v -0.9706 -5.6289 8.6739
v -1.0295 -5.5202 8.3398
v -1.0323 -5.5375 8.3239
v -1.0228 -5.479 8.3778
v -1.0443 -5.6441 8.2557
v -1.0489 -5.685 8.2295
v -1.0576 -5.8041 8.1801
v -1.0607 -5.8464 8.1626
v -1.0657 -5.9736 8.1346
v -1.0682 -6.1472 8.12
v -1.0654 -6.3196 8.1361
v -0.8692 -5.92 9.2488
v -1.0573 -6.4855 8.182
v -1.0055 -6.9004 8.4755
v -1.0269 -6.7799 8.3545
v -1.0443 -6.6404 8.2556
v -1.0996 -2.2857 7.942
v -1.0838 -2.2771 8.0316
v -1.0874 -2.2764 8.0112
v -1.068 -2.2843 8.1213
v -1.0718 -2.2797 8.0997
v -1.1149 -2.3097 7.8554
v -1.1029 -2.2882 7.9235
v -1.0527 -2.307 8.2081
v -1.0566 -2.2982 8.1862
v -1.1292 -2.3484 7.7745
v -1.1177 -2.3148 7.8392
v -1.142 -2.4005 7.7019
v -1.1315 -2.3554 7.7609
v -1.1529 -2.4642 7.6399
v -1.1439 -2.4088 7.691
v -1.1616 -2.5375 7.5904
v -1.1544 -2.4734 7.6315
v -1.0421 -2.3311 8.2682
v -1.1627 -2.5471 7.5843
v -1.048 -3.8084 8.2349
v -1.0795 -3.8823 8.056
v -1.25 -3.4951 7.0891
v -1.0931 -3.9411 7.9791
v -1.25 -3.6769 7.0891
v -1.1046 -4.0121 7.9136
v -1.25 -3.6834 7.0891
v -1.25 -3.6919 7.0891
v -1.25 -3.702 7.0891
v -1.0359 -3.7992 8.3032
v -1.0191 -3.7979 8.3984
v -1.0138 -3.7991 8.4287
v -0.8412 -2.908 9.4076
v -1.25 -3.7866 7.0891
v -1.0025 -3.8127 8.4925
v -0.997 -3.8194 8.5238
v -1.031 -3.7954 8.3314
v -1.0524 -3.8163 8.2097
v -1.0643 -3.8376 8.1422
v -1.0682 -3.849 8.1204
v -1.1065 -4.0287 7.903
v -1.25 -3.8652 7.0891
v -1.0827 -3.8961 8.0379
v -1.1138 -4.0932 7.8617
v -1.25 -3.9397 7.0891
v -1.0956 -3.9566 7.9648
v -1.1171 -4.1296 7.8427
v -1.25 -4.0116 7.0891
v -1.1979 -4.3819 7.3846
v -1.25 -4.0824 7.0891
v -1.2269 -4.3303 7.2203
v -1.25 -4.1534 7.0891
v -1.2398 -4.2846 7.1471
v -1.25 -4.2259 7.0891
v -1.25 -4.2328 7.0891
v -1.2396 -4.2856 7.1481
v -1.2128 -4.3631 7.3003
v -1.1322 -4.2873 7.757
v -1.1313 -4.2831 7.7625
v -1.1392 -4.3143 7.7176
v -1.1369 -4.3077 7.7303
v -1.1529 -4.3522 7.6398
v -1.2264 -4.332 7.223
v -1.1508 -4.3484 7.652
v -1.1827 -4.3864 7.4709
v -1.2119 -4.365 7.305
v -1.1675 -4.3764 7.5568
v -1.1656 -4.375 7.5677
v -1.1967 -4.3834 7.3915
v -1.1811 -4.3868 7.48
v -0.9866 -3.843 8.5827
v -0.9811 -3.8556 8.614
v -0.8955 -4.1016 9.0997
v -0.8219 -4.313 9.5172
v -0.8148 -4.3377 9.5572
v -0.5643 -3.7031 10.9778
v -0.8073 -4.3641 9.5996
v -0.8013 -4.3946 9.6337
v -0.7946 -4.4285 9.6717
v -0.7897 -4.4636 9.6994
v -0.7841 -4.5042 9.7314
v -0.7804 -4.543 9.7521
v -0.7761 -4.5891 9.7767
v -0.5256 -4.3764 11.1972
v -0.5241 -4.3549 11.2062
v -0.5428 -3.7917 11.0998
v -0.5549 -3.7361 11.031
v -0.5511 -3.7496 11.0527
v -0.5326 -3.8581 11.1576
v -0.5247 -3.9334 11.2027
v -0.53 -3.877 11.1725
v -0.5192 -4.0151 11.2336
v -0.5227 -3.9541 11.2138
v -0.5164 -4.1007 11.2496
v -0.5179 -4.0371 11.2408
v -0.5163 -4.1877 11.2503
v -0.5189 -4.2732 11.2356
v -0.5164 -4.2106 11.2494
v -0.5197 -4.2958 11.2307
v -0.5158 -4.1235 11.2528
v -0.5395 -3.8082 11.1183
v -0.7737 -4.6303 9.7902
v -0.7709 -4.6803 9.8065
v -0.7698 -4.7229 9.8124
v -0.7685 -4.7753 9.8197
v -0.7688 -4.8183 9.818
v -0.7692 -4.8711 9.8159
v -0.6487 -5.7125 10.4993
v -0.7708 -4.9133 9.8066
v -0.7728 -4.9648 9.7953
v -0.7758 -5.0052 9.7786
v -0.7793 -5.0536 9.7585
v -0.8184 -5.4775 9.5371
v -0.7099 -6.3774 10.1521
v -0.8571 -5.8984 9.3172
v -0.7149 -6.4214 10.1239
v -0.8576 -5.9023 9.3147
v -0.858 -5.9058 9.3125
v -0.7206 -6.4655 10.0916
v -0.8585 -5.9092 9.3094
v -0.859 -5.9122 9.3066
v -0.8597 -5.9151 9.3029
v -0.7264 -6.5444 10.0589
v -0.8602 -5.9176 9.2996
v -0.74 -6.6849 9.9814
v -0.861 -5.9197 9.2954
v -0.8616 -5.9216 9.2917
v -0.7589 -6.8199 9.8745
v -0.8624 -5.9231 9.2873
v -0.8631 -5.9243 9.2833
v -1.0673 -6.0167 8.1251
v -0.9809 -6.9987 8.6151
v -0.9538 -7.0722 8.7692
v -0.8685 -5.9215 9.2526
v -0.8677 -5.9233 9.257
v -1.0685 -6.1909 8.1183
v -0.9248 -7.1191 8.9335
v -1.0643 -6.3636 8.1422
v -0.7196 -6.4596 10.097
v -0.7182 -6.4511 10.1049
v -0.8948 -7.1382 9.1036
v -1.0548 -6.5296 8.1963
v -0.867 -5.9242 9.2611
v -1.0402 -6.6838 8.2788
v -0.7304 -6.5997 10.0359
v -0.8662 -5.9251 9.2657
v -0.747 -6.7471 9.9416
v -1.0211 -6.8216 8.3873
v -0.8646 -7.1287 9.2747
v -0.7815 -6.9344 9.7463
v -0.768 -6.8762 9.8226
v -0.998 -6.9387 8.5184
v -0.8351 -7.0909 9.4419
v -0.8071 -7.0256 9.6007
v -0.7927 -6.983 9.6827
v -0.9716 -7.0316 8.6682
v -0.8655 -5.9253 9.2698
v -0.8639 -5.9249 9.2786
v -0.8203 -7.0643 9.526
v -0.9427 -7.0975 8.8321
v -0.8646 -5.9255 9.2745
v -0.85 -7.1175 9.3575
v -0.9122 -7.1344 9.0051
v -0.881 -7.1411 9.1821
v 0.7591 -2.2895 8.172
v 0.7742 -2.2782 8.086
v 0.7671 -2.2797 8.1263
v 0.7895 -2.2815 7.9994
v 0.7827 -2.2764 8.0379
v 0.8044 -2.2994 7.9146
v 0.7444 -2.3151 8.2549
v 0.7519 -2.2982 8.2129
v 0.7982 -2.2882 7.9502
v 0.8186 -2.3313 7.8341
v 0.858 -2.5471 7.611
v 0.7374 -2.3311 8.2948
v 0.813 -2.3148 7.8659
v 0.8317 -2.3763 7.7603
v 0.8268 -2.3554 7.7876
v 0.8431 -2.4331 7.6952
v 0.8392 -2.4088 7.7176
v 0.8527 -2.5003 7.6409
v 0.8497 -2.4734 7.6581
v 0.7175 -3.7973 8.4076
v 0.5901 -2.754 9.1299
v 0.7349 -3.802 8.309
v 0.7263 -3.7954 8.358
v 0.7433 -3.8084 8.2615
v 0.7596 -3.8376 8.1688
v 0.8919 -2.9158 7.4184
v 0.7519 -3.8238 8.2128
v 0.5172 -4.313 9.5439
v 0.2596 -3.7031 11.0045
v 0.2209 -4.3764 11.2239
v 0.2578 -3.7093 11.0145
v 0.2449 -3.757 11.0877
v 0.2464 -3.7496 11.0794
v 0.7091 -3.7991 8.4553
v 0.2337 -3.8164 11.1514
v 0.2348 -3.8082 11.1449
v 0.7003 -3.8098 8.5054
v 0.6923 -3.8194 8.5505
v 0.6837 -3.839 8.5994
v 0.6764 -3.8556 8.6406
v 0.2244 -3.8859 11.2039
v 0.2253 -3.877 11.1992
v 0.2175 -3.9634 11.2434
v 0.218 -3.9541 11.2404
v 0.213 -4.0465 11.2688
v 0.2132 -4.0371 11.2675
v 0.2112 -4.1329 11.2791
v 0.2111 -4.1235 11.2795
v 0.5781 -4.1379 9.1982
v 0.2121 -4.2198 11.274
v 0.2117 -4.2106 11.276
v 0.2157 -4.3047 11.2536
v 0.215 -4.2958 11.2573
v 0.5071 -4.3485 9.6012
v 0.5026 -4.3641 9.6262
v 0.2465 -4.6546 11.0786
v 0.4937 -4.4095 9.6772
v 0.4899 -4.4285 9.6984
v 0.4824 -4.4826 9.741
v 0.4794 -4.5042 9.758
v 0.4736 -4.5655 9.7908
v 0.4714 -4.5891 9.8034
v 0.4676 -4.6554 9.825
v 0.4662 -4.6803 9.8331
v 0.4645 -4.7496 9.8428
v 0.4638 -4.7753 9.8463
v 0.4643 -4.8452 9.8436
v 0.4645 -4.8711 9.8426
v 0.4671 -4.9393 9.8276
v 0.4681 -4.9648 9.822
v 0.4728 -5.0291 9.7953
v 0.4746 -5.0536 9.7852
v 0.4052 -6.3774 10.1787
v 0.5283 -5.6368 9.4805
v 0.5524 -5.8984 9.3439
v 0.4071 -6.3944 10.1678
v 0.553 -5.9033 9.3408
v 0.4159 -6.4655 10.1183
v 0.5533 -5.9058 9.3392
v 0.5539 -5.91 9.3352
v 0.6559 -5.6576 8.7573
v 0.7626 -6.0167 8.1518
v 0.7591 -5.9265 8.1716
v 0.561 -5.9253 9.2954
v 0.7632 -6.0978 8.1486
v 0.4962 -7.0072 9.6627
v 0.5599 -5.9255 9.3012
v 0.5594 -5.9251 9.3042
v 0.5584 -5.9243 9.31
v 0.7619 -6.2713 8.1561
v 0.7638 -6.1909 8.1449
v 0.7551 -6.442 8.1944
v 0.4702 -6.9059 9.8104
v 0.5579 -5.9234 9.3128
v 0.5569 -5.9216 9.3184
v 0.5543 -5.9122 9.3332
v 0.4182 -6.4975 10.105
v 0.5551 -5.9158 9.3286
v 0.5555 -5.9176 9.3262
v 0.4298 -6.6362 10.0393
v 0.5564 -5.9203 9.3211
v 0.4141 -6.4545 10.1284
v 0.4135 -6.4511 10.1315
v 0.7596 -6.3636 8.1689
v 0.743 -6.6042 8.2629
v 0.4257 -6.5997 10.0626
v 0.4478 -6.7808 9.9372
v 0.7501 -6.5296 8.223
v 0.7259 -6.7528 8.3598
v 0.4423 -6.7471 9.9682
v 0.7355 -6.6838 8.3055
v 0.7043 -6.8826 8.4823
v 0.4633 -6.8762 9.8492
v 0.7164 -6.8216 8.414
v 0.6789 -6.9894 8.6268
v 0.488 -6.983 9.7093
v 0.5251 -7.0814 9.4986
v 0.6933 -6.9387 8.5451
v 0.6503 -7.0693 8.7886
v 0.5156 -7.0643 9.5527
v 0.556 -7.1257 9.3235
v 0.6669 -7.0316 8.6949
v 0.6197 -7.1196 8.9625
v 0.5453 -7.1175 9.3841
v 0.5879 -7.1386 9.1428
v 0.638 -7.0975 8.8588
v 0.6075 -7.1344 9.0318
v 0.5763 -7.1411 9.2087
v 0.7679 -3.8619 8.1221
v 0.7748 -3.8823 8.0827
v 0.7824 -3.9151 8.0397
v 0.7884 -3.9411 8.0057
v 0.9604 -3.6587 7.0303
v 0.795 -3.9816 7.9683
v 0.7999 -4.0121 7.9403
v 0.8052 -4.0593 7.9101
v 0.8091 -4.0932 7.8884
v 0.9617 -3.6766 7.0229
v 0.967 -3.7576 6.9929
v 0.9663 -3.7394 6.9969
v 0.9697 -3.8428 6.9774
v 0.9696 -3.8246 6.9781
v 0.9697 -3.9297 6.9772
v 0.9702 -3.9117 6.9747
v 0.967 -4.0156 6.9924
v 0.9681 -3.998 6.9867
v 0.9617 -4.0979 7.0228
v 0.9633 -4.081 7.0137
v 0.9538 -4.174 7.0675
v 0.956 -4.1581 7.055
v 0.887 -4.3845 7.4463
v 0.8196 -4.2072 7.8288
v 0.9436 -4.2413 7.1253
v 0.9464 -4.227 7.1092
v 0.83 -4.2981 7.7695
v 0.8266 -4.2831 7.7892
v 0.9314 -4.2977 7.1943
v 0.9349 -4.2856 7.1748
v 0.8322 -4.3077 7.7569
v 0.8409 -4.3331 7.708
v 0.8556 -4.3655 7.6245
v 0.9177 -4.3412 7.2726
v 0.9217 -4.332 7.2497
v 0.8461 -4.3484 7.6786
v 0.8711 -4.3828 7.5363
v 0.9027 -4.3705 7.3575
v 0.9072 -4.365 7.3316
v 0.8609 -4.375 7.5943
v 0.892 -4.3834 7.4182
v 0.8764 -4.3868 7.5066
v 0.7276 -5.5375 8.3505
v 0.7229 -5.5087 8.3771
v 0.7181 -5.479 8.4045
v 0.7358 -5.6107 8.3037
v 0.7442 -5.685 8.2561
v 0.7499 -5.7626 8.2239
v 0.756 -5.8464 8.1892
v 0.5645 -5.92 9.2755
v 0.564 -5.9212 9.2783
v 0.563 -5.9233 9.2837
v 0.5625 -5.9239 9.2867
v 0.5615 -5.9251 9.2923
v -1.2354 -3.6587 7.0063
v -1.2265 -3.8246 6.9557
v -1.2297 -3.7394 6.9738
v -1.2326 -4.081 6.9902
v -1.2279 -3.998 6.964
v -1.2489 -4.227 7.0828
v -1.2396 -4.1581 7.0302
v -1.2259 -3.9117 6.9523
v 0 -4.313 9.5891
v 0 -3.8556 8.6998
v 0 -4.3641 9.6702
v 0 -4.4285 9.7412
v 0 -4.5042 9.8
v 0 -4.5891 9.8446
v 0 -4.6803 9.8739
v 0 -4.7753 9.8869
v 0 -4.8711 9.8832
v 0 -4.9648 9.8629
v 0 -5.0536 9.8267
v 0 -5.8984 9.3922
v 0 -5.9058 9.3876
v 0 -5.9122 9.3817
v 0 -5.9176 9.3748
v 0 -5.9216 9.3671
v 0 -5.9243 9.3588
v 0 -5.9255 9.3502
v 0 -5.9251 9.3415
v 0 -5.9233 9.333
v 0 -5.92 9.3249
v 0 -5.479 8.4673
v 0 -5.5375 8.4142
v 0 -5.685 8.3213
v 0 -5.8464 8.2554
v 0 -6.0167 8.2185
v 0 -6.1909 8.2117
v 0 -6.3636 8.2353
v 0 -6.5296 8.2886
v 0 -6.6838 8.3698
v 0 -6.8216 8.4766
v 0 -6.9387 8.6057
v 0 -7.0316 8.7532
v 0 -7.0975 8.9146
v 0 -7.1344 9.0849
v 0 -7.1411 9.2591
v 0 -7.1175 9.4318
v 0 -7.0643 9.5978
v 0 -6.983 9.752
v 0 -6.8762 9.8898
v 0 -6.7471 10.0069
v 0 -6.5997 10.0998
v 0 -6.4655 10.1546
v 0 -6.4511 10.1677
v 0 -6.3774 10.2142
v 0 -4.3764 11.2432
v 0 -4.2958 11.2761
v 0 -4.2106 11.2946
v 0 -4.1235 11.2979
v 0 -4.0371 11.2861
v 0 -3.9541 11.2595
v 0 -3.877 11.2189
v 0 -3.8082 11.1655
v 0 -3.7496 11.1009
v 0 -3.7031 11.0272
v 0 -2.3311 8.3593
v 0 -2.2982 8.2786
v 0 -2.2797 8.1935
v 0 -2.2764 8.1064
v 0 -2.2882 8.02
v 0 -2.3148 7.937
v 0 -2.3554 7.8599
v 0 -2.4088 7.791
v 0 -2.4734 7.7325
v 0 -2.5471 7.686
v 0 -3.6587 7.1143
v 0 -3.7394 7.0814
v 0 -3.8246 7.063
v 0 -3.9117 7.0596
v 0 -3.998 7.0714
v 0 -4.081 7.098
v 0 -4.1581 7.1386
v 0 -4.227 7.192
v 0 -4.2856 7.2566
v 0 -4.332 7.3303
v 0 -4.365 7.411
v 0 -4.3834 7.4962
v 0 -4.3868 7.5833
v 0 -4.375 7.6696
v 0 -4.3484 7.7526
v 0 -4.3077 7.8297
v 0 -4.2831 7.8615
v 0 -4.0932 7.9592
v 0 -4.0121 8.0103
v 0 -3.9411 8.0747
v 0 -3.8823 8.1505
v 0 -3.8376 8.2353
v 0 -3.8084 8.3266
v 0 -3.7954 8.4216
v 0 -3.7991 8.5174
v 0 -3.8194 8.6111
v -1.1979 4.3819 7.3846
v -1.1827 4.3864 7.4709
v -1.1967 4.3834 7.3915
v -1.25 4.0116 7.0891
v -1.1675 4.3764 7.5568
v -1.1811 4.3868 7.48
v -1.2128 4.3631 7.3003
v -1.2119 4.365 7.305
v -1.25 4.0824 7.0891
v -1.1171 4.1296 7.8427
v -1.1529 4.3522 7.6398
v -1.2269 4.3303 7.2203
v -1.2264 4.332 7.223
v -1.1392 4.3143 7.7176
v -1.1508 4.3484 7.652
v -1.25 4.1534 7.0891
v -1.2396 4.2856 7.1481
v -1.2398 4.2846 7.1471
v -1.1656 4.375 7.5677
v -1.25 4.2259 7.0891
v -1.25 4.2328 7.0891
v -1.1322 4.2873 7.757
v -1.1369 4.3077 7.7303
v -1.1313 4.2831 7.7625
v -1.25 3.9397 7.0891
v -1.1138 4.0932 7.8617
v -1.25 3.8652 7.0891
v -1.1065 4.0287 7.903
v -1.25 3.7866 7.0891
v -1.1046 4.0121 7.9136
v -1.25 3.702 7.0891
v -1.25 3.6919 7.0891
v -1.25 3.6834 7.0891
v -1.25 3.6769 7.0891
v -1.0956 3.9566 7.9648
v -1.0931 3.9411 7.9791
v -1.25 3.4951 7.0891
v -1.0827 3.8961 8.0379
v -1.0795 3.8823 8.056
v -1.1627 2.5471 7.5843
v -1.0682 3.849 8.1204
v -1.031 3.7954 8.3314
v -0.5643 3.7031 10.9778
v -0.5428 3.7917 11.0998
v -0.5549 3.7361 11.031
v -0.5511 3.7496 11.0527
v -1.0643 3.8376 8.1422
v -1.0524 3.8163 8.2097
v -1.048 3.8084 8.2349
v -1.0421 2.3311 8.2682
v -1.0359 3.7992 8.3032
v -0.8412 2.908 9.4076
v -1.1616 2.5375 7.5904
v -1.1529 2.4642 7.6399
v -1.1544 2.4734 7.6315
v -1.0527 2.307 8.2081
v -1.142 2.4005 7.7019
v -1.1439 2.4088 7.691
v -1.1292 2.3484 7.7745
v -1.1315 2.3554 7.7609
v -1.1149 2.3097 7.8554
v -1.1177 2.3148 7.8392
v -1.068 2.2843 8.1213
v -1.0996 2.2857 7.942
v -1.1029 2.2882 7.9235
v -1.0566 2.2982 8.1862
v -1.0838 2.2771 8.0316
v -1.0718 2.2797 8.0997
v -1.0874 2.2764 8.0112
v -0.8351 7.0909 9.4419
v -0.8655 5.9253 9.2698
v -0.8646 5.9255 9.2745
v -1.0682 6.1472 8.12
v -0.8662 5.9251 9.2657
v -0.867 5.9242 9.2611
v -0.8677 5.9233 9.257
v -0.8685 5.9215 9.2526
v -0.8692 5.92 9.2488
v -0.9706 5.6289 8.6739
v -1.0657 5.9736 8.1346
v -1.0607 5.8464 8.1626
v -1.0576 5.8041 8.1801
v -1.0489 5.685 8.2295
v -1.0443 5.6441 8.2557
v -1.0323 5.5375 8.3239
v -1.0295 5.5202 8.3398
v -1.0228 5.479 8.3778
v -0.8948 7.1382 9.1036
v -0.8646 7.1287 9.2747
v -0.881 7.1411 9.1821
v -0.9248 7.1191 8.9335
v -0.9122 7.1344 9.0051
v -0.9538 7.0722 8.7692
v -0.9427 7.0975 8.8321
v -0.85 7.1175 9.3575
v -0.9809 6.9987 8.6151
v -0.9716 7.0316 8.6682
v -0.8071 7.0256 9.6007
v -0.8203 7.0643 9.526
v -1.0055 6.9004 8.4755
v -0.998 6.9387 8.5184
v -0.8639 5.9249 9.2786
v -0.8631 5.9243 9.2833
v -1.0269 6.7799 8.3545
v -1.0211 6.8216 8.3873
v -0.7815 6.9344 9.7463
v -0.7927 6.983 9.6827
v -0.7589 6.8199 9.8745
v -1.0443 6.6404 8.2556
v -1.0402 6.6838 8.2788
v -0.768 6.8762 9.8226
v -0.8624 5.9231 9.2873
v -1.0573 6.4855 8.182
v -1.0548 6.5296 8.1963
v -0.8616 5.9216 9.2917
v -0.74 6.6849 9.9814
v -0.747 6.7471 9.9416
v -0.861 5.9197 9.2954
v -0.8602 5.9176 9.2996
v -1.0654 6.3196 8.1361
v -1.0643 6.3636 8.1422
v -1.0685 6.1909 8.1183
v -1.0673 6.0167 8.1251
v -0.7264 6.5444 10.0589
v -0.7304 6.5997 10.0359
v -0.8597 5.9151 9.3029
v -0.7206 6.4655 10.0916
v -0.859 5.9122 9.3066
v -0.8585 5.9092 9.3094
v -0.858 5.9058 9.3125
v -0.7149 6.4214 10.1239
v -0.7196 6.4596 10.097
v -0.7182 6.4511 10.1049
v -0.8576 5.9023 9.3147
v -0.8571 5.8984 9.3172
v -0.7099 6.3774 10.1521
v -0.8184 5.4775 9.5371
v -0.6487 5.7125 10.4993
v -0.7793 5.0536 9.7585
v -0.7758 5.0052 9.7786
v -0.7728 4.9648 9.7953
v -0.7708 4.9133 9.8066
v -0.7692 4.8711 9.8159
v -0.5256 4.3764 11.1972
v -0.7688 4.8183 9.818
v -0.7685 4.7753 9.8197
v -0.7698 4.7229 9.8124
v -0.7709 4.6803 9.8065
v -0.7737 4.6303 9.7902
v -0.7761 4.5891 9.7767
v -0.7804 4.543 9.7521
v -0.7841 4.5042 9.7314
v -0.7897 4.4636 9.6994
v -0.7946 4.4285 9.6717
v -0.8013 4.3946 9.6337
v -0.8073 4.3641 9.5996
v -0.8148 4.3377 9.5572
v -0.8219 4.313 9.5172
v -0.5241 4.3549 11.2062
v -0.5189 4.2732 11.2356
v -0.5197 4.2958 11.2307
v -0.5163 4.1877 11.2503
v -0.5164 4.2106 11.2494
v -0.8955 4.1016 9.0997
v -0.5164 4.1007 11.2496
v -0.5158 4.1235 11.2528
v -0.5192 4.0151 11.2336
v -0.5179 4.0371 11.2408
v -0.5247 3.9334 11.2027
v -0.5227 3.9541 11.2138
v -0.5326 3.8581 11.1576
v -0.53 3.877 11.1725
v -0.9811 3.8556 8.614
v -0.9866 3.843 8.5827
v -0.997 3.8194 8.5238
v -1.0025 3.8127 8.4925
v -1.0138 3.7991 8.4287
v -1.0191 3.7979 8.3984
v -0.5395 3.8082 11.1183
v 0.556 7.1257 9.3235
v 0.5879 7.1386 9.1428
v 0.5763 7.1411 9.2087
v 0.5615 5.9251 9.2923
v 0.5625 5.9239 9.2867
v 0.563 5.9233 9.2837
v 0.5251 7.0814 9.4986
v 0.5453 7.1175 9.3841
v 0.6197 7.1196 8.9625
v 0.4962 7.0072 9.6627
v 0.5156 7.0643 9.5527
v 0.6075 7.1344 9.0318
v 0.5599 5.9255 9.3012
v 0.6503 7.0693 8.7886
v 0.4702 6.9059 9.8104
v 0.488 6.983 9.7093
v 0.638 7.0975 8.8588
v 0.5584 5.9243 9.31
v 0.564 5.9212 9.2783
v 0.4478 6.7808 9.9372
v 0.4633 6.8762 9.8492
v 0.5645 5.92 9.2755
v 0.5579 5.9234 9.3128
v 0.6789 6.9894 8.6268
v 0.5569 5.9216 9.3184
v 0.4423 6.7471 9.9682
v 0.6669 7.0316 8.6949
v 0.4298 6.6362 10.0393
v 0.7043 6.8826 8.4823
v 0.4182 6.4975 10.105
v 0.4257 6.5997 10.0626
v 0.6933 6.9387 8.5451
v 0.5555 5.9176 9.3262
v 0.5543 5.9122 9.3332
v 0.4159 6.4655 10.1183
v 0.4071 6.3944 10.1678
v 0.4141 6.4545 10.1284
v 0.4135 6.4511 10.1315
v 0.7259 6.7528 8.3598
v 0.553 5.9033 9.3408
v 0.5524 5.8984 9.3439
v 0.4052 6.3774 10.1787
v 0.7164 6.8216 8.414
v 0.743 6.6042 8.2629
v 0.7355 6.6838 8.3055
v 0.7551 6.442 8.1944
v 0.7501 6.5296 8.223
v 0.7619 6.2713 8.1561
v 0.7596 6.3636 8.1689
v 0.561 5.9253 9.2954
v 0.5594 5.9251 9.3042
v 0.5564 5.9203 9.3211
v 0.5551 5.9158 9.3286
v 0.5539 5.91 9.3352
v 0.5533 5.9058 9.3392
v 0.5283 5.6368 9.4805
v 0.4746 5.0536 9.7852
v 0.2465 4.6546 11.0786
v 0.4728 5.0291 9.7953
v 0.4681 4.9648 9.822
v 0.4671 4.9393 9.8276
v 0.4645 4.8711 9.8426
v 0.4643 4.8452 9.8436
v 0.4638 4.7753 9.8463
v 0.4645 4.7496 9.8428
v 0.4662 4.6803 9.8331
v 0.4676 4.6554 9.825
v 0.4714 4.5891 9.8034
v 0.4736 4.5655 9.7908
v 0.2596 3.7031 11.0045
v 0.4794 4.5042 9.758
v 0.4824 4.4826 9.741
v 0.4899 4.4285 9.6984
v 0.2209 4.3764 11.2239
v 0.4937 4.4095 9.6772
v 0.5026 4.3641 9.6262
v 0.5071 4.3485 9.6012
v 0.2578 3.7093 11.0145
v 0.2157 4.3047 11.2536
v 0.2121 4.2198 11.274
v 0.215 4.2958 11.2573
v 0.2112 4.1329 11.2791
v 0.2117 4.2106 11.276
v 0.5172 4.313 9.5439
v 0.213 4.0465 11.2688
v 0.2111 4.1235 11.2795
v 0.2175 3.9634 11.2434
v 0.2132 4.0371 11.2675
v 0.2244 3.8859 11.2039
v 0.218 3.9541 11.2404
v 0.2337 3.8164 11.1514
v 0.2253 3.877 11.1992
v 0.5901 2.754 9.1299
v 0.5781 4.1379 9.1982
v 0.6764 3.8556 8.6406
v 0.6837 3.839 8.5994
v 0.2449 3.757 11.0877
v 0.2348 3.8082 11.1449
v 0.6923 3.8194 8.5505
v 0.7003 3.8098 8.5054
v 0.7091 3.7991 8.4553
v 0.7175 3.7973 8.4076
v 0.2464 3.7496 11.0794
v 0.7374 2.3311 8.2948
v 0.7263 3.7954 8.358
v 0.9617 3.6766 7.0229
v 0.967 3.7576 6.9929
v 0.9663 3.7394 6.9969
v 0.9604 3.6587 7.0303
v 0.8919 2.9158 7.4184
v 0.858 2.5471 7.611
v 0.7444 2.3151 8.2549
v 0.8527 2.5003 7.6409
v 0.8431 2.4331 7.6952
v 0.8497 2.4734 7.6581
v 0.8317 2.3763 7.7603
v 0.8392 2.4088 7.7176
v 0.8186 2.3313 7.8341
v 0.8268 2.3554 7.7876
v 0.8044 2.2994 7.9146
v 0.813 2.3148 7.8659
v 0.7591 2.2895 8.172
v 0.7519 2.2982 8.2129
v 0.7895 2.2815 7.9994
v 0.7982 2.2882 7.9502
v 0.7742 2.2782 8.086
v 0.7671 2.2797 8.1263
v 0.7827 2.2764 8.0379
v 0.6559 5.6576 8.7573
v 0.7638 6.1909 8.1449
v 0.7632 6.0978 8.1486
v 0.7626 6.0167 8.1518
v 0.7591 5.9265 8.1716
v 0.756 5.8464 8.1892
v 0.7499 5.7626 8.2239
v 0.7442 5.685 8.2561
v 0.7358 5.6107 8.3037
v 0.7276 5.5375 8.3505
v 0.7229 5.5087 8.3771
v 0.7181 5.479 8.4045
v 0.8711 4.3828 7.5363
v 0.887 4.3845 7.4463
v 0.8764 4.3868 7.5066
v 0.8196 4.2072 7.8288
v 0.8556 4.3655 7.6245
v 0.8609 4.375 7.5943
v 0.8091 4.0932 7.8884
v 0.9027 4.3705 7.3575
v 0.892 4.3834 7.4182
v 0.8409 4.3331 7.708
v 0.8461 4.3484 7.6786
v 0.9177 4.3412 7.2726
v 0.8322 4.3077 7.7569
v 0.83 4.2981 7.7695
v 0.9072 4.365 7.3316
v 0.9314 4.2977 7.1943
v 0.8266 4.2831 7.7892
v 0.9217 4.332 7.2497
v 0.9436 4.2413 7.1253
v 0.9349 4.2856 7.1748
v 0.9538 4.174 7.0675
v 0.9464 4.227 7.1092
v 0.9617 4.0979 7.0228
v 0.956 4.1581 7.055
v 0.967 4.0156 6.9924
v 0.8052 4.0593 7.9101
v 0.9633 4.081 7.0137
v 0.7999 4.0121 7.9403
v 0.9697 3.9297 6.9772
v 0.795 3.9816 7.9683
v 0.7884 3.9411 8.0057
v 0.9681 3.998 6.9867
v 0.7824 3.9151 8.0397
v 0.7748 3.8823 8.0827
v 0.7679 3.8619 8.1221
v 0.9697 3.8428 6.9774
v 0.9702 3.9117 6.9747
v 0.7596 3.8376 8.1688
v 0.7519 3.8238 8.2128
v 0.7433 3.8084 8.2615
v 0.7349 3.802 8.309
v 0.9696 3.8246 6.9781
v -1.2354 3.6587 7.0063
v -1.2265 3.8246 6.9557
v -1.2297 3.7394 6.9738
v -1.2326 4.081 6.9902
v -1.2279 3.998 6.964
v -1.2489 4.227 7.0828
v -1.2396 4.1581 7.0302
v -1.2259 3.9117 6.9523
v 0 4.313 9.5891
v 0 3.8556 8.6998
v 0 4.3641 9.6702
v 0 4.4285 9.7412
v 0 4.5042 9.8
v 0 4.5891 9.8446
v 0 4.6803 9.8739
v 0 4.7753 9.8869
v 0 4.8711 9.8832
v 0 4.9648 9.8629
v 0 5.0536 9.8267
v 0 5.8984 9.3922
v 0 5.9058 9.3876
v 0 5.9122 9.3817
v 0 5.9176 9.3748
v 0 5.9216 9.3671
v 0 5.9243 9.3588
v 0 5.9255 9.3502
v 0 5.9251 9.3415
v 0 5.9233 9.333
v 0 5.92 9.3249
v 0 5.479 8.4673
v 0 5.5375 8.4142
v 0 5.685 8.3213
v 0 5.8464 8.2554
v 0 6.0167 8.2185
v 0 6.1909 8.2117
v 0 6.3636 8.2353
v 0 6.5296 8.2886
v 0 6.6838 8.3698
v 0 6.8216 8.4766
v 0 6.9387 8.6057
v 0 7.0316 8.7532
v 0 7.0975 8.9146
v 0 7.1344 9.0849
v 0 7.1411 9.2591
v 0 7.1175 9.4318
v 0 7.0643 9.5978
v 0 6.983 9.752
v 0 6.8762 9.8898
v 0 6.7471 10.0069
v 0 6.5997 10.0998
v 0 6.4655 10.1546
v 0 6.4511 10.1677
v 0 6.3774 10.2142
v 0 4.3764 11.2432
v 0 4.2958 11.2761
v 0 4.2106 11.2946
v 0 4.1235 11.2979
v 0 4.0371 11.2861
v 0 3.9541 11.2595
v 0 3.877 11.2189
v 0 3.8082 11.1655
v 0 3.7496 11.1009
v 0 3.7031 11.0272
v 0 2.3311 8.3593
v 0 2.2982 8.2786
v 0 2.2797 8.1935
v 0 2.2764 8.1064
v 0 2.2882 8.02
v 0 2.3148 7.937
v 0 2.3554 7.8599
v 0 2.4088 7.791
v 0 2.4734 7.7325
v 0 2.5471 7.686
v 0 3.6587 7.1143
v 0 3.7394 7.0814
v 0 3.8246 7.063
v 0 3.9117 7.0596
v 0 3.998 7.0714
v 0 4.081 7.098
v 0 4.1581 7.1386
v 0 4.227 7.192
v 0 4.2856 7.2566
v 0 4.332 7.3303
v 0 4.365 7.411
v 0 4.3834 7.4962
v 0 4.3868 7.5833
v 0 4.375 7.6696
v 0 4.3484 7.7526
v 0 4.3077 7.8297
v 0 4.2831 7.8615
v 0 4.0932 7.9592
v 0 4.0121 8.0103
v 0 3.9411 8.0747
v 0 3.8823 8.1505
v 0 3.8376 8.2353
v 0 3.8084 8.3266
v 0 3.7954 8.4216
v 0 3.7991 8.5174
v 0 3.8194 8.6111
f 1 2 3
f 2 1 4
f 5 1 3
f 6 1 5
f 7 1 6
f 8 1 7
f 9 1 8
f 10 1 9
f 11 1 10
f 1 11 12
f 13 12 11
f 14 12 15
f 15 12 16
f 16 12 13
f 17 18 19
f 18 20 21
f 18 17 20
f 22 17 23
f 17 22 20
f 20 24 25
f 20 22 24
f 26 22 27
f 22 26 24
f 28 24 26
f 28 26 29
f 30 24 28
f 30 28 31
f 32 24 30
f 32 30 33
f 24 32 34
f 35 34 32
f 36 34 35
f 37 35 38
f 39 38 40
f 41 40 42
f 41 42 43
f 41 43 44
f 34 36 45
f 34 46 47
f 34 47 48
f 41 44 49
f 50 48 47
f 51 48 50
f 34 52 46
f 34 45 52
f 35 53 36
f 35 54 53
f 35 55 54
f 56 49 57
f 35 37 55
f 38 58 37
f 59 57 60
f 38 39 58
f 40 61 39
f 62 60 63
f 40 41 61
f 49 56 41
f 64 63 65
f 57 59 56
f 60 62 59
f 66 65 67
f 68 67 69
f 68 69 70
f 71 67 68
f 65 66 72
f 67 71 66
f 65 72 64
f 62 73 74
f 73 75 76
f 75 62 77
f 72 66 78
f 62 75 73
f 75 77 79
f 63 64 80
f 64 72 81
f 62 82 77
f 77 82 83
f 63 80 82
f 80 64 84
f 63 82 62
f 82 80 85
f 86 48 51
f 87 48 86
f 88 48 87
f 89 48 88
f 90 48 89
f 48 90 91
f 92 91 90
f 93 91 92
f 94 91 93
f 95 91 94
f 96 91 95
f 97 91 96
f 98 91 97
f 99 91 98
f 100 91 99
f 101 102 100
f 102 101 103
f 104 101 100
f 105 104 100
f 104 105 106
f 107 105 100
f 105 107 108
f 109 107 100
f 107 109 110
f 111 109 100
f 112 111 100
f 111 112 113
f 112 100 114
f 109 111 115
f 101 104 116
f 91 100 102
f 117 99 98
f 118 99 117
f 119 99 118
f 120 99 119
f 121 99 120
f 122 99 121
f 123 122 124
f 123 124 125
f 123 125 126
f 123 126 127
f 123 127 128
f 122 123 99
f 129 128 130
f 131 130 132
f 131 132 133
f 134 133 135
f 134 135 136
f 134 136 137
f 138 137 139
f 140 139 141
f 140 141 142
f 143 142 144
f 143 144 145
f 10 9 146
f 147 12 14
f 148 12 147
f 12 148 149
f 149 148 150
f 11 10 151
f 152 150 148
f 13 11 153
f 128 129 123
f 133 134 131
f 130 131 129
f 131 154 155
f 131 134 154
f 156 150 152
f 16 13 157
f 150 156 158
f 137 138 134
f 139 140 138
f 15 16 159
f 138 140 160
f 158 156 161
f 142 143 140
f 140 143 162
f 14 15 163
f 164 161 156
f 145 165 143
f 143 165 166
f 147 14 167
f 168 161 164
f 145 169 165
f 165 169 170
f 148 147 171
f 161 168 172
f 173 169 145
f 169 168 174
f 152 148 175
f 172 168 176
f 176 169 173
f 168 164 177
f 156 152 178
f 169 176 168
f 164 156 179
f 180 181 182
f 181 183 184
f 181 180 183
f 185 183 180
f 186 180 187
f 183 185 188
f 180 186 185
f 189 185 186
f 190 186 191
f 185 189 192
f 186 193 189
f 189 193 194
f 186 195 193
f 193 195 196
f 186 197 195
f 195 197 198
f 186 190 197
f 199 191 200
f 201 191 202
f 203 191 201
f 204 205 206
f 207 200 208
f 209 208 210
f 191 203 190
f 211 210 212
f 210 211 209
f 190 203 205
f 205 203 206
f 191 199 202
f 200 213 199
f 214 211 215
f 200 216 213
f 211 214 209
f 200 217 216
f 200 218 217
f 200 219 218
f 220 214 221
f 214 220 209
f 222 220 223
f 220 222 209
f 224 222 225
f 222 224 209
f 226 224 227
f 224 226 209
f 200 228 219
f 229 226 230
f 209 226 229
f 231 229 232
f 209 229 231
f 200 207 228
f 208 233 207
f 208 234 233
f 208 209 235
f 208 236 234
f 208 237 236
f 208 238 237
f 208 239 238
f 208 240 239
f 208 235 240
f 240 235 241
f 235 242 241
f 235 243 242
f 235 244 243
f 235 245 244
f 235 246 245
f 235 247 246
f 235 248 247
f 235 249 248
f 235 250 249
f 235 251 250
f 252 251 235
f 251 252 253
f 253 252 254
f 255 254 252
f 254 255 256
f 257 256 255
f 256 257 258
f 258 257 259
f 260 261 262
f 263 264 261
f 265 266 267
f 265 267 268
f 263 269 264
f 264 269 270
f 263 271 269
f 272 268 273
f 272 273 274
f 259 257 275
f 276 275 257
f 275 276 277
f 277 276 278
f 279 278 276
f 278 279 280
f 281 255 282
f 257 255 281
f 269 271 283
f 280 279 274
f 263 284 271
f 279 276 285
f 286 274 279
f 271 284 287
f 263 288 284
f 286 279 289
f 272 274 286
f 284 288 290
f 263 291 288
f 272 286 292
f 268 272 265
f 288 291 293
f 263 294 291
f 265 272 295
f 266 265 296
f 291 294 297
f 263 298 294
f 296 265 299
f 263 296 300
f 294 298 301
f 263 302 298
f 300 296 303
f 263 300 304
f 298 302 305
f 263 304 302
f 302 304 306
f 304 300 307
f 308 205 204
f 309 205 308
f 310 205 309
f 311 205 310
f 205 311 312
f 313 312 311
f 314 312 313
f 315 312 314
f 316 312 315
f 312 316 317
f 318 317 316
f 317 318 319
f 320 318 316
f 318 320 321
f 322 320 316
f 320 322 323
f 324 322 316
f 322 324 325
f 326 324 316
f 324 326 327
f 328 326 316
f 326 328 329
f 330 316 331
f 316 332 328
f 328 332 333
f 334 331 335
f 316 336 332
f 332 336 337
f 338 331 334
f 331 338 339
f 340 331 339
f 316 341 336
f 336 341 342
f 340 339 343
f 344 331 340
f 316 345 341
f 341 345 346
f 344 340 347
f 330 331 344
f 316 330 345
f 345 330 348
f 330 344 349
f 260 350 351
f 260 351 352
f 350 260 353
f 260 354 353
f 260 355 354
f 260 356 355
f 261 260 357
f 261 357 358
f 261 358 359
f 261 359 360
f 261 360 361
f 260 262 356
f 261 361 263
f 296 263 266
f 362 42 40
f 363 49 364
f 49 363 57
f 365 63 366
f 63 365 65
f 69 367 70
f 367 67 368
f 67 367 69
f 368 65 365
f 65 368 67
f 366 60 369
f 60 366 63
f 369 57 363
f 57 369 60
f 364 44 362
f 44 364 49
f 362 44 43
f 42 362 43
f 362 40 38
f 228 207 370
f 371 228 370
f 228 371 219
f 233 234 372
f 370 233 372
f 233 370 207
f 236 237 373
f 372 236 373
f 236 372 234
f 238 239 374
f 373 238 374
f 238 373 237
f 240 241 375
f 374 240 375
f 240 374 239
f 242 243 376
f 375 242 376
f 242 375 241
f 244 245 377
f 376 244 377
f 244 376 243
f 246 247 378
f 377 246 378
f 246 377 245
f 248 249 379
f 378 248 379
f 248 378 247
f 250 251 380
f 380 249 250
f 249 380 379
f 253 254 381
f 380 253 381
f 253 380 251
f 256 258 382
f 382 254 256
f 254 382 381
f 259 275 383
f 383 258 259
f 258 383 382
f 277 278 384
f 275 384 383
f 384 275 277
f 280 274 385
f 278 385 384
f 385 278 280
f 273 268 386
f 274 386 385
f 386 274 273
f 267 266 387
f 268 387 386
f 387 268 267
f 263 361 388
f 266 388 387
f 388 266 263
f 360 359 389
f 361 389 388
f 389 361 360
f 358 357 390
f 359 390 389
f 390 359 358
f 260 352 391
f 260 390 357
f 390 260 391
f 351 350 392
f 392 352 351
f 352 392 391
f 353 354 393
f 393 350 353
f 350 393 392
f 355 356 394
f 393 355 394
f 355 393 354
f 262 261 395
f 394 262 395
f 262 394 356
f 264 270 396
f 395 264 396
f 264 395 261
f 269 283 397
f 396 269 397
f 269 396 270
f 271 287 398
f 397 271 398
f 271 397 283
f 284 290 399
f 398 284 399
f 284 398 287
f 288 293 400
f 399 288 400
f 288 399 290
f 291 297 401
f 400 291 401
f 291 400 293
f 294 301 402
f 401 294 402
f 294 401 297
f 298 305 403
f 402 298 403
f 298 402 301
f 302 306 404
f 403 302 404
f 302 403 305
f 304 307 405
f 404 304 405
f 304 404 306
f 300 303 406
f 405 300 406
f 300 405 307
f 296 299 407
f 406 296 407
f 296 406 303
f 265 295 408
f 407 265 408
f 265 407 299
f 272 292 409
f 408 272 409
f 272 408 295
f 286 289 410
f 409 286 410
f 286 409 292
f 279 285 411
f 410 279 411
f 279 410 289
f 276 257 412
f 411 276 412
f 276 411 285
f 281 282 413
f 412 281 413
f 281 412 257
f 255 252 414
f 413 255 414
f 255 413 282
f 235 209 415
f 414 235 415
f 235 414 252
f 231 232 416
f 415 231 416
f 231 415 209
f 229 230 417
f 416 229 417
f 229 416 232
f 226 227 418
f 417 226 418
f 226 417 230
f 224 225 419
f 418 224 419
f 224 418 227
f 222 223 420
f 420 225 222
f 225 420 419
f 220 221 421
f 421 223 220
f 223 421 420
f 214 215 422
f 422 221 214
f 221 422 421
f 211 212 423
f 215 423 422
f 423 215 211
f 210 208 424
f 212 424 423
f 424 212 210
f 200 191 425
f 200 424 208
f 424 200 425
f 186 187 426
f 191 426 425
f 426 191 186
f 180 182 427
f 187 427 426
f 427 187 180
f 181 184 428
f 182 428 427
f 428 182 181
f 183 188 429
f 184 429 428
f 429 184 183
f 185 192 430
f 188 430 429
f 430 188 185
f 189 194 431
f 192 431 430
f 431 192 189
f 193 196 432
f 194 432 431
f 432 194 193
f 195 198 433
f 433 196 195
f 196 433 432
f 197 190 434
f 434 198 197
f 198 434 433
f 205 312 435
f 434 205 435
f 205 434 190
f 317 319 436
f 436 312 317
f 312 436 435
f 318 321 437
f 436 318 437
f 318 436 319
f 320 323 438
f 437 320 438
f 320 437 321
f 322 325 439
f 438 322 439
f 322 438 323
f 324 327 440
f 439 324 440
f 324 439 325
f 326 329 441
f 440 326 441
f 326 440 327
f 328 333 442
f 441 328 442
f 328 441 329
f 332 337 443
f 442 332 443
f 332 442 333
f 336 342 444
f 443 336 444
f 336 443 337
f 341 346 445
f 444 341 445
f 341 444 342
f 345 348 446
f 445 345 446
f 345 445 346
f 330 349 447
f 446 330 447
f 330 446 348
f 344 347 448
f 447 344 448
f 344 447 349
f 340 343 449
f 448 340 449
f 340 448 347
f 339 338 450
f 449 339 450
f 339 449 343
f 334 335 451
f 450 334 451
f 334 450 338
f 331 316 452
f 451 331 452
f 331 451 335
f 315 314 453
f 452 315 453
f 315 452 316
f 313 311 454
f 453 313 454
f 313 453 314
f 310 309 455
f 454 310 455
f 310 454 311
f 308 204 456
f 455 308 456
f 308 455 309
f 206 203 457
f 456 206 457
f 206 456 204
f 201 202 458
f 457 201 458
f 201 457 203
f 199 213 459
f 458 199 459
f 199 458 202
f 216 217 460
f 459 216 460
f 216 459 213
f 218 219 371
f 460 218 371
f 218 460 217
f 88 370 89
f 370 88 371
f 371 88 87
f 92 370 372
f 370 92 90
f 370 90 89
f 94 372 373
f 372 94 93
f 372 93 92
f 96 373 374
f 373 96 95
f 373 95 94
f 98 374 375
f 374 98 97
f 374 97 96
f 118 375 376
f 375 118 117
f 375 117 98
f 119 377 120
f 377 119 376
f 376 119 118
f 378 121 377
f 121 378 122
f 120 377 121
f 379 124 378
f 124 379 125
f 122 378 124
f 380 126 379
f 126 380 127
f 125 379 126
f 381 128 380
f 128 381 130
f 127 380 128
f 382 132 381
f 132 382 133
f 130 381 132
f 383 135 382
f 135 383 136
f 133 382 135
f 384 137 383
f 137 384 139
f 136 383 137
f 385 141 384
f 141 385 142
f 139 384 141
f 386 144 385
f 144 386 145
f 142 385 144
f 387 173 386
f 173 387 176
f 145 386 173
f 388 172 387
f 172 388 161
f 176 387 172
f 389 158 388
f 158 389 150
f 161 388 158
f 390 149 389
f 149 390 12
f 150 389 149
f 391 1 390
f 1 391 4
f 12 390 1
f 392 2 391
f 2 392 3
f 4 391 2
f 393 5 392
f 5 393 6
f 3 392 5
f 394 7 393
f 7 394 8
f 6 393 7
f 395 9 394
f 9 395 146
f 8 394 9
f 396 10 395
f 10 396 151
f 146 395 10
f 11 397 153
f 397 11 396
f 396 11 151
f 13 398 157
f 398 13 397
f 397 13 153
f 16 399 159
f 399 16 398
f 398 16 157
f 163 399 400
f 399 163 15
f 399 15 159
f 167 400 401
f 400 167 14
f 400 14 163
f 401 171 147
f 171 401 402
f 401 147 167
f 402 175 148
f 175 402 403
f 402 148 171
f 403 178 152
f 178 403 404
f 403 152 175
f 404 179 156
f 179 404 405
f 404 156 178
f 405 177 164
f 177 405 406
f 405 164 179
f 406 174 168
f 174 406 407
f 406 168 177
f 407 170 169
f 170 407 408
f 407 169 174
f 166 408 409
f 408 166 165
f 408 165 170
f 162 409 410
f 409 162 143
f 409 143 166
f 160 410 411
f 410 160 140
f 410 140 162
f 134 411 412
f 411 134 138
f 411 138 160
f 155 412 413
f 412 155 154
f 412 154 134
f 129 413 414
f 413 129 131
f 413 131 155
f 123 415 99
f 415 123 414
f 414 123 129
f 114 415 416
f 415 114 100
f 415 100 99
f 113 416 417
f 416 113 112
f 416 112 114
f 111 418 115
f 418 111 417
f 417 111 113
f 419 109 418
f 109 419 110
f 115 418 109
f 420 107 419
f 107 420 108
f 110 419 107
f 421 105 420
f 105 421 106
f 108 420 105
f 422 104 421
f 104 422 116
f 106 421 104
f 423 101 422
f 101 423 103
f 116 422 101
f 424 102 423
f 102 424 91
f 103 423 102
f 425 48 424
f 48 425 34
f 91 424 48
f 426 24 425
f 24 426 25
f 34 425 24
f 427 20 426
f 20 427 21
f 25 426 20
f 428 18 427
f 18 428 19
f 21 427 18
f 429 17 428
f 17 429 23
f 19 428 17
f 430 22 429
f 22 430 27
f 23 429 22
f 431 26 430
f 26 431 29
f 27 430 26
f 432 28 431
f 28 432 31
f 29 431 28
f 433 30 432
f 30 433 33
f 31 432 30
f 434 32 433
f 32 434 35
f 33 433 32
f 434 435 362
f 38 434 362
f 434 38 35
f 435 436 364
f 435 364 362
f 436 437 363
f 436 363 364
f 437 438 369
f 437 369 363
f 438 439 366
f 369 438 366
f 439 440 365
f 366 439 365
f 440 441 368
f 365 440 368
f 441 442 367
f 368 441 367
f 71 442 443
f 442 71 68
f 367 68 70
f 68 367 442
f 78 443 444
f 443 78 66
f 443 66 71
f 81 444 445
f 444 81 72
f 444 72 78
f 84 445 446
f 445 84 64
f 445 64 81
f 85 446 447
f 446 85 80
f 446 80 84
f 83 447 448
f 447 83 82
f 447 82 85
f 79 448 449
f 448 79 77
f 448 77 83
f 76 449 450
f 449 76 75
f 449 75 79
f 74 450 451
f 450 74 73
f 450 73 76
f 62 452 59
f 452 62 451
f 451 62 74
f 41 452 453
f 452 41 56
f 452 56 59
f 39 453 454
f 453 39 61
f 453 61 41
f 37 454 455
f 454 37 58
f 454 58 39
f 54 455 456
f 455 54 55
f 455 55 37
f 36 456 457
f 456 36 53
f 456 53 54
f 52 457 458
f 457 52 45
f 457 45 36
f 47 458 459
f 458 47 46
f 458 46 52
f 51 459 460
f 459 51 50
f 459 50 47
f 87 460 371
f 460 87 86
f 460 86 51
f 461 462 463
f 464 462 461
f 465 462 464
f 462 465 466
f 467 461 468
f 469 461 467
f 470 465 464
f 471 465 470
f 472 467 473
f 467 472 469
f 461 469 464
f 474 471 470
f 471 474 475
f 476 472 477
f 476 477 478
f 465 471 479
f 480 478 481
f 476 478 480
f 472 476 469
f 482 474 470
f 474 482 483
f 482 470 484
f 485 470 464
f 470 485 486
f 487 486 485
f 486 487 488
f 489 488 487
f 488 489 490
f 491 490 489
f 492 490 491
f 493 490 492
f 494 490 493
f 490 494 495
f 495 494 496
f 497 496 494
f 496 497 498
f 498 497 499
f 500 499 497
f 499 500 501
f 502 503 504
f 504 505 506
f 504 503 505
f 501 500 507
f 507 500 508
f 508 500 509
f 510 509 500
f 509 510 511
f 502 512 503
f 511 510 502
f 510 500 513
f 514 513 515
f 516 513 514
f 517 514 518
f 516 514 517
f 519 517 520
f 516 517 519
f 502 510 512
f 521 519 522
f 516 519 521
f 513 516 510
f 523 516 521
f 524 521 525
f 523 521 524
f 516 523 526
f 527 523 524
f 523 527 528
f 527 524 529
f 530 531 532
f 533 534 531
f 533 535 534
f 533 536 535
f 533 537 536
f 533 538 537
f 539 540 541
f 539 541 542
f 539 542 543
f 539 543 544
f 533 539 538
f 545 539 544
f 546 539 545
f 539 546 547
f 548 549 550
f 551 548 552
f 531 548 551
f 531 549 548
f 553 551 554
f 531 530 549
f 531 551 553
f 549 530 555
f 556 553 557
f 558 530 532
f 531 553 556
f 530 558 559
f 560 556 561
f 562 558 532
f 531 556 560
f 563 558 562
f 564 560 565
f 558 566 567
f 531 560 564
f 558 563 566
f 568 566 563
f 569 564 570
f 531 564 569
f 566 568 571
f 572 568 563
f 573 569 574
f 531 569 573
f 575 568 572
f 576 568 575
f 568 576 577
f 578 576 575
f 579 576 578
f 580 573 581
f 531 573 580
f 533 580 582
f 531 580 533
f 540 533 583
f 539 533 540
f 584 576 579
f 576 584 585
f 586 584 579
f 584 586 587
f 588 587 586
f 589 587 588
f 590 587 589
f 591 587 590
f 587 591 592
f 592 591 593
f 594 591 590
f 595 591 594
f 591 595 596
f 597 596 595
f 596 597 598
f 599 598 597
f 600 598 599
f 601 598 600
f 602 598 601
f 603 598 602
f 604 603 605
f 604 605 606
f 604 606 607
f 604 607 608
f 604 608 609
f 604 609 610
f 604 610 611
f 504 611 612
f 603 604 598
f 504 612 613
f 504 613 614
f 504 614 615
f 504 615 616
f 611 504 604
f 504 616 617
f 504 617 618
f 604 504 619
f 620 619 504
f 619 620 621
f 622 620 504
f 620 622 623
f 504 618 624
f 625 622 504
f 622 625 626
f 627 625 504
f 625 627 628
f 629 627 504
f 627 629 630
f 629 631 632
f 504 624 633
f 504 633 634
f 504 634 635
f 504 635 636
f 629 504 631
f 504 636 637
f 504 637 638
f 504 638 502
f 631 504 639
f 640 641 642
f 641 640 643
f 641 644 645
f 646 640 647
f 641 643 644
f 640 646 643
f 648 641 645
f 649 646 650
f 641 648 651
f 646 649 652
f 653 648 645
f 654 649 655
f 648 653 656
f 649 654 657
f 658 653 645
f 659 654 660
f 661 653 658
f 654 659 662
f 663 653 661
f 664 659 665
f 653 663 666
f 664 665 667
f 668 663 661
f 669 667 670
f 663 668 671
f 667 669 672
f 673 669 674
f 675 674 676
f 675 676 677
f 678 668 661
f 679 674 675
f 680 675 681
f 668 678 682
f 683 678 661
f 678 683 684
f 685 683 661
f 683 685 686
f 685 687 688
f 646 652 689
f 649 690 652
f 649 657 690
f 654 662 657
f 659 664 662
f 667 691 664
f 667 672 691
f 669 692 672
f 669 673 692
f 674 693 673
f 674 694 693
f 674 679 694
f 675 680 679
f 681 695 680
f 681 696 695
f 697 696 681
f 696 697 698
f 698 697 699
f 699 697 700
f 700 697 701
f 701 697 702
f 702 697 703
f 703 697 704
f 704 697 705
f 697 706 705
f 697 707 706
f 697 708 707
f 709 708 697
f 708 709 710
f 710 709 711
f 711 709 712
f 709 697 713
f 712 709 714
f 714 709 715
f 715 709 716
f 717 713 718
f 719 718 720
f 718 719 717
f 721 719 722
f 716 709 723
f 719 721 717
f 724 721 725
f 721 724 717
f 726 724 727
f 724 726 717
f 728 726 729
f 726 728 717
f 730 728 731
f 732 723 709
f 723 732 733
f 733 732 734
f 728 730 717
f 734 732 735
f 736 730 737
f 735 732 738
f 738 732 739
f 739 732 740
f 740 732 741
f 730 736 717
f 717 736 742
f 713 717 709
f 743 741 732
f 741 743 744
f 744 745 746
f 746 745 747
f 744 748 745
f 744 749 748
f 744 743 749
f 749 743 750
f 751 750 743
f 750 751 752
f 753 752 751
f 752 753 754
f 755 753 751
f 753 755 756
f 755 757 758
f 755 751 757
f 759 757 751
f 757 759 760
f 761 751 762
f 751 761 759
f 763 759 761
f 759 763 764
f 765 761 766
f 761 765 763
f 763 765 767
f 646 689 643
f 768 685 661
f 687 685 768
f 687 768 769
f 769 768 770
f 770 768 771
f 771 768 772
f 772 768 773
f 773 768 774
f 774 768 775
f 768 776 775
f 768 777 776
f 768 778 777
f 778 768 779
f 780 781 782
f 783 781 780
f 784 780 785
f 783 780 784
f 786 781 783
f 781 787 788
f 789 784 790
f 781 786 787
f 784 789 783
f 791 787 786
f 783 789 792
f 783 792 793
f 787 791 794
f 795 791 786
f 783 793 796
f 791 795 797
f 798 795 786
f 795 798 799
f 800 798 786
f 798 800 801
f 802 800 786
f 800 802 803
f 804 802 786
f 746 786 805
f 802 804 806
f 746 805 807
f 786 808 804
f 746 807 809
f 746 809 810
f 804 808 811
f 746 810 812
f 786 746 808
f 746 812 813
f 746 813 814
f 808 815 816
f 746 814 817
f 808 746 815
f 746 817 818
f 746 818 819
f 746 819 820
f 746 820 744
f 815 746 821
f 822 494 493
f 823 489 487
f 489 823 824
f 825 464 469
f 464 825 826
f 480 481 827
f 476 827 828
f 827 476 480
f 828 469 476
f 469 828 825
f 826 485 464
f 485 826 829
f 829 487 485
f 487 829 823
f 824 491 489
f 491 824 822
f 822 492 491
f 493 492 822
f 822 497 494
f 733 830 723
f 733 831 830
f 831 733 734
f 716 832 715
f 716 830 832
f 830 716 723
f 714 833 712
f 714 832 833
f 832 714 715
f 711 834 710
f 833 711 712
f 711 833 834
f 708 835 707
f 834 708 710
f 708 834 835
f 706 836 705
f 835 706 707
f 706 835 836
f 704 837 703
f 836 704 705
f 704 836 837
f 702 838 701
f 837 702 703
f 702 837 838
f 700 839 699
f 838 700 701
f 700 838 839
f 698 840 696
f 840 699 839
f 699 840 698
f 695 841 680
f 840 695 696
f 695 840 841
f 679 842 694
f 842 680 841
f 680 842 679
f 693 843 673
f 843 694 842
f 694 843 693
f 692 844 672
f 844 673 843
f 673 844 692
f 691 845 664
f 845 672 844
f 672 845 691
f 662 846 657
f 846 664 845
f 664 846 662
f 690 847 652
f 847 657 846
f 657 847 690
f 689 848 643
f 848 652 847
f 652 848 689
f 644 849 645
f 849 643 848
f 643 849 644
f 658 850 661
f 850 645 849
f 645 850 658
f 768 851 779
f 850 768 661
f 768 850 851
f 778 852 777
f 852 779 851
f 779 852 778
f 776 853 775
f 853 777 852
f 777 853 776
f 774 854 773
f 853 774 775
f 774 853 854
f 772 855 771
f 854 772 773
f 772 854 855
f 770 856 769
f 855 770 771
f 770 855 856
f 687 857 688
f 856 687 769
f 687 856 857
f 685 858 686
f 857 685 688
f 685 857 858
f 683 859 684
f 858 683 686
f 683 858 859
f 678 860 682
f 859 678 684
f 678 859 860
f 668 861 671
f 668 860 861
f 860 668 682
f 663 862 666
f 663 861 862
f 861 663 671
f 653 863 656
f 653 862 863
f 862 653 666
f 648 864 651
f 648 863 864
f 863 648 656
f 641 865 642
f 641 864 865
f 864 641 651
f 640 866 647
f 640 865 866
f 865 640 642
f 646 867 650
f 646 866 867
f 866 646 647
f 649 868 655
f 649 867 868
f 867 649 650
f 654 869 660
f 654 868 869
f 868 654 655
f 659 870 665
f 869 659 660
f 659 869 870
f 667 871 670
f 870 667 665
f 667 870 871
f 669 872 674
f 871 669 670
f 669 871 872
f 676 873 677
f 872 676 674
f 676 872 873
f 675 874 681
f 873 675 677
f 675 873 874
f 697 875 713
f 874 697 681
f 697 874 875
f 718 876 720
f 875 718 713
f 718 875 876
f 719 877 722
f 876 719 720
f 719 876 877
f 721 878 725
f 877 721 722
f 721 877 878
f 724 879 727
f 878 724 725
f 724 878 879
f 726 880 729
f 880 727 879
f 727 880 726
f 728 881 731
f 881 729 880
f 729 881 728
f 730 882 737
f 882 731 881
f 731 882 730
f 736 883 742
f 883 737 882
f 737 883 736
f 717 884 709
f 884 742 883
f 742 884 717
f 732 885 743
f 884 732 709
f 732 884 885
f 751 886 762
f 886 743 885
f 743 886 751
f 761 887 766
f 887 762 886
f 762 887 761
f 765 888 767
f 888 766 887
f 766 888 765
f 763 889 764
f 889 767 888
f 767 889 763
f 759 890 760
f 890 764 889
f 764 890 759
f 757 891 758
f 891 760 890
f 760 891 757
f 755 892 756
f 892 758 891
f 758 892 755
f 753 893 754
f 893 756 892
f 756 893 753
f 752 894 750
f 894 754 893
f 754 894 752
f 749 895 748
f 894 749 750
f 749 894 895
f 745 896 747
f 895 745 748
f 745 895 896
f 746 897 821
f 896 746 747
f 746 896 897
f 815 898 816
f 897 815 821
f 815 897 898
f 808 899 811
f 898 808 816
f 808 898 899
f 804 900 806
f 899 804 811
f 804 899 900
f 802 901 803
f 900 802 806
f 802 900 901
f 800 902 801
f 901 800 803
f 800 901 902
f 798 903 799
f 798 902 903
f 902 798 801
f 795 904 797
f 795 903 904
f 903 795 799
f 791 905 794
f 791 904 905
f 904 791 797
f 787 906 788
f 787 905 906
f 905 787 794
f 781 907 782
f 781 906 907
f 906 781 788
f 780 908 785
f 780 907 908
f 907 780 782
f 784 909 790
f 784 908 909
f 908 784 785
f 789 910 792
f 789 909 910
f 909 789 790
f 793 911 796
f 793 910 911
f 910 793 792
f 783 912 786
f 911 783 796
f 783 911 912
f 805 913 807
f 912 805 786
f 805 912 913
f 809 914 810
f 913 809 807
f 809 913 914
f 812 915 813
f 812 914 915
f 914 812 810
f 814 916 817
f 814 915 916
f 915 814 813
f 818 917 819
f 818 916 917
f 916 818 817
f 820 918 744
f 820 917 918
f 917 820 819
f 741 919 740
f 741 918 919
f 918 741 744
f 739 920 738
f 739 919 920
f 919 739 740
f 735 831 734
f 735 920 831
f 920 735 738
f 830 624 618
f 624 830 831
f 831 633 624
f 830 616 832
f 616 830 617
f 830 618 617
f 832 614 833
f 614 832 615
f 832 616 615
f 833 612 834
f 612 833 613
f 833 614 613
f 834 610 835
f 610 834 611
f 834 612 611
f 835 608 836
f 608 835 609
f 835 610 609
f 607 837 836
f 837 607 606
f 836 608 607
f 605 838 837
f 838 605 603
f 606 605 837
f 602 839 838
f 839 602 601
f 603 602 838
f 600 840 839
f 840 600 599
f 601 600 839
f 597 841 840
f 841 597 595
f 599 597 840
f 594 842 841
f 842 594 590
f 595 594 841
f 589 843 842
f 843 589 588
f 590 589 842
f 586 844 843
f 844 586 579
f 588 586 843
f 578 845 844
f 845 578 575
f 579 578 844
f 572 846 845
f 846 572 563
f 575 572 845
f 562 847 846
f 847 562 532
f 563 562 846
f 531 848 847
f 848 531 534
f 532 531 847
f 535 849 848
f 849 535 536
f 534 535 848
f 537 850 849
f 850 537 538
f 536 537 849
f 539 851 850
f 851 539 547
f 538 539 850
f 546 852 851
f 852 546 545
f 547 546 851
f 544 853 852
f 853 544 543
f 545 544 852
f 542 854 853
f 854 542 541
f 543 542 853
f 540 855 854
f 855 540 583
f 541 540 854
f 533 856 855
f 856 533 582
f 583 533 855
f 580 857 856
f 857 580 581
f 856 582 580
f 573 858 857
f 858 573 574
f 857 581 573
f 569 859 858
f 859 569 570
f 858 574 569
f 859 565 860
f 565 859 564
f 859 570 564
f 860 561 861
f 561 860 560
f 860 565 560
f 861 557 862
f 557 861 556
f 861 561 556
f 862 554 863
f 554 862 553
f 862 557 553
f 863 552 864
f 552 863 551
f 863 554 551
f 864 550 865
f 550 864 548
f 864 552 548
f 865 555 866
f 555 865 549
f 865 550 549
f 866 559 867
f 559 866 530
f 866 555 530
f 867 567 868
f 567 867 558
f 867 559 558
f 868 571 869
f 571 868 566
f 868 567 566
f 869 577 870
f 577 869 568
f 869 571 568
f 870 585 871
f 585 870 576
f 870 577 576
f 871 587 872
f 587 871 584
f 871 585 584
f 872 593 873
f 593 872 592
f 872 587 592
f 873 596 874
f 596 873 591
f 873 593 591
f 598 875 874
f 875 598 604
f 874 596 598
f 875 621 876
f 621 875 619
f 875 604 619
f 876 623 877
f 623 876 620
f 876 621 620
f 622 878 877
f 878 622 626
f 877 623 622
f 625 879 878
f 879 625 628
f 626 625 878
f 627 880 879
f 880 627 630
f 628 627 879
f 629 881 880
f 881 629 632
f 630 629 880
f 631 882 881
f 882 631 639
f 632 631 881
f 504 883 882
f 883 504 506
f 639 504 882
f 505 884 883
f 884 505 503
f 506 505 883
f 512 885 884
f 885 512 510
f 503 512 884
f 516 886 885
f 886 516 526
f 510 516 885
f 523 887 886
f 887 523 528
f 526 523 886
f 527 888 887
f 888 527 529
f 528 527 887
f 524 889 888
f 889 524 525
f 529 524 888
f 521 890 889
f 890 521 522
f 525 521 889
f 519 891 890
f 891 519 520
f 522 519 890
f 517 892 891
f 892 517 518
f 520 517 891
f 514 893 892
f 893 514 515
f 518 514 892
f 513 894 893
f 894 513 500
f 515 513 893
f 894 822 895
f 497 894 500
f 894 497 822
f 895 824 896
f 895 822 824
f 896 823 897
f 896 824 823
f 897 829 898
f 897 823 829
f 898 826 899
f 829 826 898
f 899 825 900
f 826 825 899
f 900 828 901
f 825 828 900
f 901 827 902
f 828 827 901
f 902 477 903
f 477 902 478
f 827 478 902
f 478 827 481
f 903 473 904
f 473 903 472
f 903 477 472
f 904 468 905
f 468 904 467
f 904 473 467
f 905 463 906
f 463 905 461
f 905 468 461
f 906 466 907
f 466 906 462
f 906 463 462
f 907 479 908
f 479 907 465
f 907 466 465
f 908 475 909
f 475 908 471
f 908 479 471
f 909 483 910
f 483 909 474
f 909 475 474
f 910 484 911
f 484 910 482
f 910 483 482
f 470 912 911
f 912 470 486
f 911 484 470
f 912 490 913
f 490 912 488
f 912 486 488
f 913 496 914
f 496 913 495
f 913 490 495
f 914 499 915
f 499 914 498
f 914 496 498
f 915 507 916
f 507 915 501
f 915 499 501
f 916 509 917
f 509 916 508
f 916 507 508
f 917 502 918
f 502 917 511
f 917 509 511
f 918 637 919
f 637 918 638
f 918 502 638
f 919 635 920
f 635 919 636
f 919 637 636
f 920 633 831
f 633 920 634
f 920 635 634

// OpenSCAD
module _lower_grip(){
     union(){
          difference(){
               union(){
                    hull(){
                         translate([0., -1.]) circle(0.5);
                         translate([1.25, -1.]) circle(0.5);
                    }
                    translate([0., -1]) square([1.75, 1]);
               }
               hull(){
                    circle(0.55);
                    translate([-0.95, 0.5]) circle(0.05);
                    translate([-1., -0.5]) square(1.);
                    translate([-0.95, -0.5]) circle(0.05);
               }
          }
     }
}


module _upper_grip(){
     union(){
          difference(){
               union(){
                    translate([-1.25, 0.5]) circle(1);
                    translate([-1.5, 0.5]) square(0.5);
                    hull(){
                         translate([-1., 1.]) circle(0.5);
                         translate([1.25, 1.]) circle(0.5);
                    }
                    translate([0., 0]) square([1.75, 1]);
               }
               hull(){
                    circle(0.55);
                    translate([-0.95, 0.5]) circle(0.05);
                    translate([-1., -0.5]) square(1.);
                    translate([-0.95, -0.5]) circle(0.05);
               }
          }
     }
}



module _grip(e=2.){
     union(){
          translate([0., -(e-1)/2]) _lower_grip();
          translate([0.55, -(e-1)/2]) square([1.2, e - 1]);
          translate([0., (e-1)/2]) _upper_grip();
     }
}


module left_grip(e=2., phi_sphere=20., shift=1.){
     angle = (2*(shift+1.75) / phi_sphere) * 180/3.1415926;
     difference(){
          union(){
               rotate([0, 10, 0]) rotate([0, 0, 90]) rotate([0, -90, 0])
                    rotate_extrude(angle=20){
                    rotate([0, 0, angle])
                         translate([phi_sphere/2, 0])
                         rotate([0, 0, -90]) _grip(e);}
          }
          union(){
               rotate([0, 0, 180]) translate([2.5, -15, 0]) rotate([0, -10, 0]) cube([30, 30, 30]);
               translate([2.2, -15, 0]) rotate([0, -10, 0]) cube([30, 30, 30]);
          }
     }
}

module right_grip(e=2., phi_sphere=20., shift=1.){
     mirror([0, 1, 0]) left_grip(e=e, phi_sphere=phi_sphere, shift=shift);
}

module _hole(e=2., phi_sphere=20., clear=4.)
{
     angle = (2*(clear/2. + 1.75) / phi_sphere) * 180/3.1415926;
     offset(r=0.15){
          union(){
               rotate([0, 0, angle])
                    translate([phi_sphere/2, 0])
                    union(){
                    rotate([0, 0, -90]) _grip(e=e);
                    translate([-e/2-1, -clear-1.]) square([2+e, clear]);
               }
               rotate([0, 0, -angle])
                    translate([phi_sphere/2, 0])
                    mirror([0, 1, 0])
                    union(){
                    rotate([0, 0, -90]) _grip(e=e);
                    translate([-e/2-1, -clear-1.]) square([2+e, clear]);
               }
               translate([phi_sphere/2+0.8, 0]) square([e+1, 2], center=true);
          }
     }
}
$fn = 36;
right_grip(e=2., phi_sphere=20., shift=3);
left_grip(e=2., phi_sphere=20., shift=3);

module sphere_hole(e=2, phi_sphere=20., clear=1, aperture=120){
     rotate([0, aperture/2, 0])
          rotate([0, 0, 90])
          rotate([0, -90, 0])
          rotate_extrude(angle=aperture){
          _hole(e=e, phi_sphere=phi_sphere, clear=clear);
     }
}
